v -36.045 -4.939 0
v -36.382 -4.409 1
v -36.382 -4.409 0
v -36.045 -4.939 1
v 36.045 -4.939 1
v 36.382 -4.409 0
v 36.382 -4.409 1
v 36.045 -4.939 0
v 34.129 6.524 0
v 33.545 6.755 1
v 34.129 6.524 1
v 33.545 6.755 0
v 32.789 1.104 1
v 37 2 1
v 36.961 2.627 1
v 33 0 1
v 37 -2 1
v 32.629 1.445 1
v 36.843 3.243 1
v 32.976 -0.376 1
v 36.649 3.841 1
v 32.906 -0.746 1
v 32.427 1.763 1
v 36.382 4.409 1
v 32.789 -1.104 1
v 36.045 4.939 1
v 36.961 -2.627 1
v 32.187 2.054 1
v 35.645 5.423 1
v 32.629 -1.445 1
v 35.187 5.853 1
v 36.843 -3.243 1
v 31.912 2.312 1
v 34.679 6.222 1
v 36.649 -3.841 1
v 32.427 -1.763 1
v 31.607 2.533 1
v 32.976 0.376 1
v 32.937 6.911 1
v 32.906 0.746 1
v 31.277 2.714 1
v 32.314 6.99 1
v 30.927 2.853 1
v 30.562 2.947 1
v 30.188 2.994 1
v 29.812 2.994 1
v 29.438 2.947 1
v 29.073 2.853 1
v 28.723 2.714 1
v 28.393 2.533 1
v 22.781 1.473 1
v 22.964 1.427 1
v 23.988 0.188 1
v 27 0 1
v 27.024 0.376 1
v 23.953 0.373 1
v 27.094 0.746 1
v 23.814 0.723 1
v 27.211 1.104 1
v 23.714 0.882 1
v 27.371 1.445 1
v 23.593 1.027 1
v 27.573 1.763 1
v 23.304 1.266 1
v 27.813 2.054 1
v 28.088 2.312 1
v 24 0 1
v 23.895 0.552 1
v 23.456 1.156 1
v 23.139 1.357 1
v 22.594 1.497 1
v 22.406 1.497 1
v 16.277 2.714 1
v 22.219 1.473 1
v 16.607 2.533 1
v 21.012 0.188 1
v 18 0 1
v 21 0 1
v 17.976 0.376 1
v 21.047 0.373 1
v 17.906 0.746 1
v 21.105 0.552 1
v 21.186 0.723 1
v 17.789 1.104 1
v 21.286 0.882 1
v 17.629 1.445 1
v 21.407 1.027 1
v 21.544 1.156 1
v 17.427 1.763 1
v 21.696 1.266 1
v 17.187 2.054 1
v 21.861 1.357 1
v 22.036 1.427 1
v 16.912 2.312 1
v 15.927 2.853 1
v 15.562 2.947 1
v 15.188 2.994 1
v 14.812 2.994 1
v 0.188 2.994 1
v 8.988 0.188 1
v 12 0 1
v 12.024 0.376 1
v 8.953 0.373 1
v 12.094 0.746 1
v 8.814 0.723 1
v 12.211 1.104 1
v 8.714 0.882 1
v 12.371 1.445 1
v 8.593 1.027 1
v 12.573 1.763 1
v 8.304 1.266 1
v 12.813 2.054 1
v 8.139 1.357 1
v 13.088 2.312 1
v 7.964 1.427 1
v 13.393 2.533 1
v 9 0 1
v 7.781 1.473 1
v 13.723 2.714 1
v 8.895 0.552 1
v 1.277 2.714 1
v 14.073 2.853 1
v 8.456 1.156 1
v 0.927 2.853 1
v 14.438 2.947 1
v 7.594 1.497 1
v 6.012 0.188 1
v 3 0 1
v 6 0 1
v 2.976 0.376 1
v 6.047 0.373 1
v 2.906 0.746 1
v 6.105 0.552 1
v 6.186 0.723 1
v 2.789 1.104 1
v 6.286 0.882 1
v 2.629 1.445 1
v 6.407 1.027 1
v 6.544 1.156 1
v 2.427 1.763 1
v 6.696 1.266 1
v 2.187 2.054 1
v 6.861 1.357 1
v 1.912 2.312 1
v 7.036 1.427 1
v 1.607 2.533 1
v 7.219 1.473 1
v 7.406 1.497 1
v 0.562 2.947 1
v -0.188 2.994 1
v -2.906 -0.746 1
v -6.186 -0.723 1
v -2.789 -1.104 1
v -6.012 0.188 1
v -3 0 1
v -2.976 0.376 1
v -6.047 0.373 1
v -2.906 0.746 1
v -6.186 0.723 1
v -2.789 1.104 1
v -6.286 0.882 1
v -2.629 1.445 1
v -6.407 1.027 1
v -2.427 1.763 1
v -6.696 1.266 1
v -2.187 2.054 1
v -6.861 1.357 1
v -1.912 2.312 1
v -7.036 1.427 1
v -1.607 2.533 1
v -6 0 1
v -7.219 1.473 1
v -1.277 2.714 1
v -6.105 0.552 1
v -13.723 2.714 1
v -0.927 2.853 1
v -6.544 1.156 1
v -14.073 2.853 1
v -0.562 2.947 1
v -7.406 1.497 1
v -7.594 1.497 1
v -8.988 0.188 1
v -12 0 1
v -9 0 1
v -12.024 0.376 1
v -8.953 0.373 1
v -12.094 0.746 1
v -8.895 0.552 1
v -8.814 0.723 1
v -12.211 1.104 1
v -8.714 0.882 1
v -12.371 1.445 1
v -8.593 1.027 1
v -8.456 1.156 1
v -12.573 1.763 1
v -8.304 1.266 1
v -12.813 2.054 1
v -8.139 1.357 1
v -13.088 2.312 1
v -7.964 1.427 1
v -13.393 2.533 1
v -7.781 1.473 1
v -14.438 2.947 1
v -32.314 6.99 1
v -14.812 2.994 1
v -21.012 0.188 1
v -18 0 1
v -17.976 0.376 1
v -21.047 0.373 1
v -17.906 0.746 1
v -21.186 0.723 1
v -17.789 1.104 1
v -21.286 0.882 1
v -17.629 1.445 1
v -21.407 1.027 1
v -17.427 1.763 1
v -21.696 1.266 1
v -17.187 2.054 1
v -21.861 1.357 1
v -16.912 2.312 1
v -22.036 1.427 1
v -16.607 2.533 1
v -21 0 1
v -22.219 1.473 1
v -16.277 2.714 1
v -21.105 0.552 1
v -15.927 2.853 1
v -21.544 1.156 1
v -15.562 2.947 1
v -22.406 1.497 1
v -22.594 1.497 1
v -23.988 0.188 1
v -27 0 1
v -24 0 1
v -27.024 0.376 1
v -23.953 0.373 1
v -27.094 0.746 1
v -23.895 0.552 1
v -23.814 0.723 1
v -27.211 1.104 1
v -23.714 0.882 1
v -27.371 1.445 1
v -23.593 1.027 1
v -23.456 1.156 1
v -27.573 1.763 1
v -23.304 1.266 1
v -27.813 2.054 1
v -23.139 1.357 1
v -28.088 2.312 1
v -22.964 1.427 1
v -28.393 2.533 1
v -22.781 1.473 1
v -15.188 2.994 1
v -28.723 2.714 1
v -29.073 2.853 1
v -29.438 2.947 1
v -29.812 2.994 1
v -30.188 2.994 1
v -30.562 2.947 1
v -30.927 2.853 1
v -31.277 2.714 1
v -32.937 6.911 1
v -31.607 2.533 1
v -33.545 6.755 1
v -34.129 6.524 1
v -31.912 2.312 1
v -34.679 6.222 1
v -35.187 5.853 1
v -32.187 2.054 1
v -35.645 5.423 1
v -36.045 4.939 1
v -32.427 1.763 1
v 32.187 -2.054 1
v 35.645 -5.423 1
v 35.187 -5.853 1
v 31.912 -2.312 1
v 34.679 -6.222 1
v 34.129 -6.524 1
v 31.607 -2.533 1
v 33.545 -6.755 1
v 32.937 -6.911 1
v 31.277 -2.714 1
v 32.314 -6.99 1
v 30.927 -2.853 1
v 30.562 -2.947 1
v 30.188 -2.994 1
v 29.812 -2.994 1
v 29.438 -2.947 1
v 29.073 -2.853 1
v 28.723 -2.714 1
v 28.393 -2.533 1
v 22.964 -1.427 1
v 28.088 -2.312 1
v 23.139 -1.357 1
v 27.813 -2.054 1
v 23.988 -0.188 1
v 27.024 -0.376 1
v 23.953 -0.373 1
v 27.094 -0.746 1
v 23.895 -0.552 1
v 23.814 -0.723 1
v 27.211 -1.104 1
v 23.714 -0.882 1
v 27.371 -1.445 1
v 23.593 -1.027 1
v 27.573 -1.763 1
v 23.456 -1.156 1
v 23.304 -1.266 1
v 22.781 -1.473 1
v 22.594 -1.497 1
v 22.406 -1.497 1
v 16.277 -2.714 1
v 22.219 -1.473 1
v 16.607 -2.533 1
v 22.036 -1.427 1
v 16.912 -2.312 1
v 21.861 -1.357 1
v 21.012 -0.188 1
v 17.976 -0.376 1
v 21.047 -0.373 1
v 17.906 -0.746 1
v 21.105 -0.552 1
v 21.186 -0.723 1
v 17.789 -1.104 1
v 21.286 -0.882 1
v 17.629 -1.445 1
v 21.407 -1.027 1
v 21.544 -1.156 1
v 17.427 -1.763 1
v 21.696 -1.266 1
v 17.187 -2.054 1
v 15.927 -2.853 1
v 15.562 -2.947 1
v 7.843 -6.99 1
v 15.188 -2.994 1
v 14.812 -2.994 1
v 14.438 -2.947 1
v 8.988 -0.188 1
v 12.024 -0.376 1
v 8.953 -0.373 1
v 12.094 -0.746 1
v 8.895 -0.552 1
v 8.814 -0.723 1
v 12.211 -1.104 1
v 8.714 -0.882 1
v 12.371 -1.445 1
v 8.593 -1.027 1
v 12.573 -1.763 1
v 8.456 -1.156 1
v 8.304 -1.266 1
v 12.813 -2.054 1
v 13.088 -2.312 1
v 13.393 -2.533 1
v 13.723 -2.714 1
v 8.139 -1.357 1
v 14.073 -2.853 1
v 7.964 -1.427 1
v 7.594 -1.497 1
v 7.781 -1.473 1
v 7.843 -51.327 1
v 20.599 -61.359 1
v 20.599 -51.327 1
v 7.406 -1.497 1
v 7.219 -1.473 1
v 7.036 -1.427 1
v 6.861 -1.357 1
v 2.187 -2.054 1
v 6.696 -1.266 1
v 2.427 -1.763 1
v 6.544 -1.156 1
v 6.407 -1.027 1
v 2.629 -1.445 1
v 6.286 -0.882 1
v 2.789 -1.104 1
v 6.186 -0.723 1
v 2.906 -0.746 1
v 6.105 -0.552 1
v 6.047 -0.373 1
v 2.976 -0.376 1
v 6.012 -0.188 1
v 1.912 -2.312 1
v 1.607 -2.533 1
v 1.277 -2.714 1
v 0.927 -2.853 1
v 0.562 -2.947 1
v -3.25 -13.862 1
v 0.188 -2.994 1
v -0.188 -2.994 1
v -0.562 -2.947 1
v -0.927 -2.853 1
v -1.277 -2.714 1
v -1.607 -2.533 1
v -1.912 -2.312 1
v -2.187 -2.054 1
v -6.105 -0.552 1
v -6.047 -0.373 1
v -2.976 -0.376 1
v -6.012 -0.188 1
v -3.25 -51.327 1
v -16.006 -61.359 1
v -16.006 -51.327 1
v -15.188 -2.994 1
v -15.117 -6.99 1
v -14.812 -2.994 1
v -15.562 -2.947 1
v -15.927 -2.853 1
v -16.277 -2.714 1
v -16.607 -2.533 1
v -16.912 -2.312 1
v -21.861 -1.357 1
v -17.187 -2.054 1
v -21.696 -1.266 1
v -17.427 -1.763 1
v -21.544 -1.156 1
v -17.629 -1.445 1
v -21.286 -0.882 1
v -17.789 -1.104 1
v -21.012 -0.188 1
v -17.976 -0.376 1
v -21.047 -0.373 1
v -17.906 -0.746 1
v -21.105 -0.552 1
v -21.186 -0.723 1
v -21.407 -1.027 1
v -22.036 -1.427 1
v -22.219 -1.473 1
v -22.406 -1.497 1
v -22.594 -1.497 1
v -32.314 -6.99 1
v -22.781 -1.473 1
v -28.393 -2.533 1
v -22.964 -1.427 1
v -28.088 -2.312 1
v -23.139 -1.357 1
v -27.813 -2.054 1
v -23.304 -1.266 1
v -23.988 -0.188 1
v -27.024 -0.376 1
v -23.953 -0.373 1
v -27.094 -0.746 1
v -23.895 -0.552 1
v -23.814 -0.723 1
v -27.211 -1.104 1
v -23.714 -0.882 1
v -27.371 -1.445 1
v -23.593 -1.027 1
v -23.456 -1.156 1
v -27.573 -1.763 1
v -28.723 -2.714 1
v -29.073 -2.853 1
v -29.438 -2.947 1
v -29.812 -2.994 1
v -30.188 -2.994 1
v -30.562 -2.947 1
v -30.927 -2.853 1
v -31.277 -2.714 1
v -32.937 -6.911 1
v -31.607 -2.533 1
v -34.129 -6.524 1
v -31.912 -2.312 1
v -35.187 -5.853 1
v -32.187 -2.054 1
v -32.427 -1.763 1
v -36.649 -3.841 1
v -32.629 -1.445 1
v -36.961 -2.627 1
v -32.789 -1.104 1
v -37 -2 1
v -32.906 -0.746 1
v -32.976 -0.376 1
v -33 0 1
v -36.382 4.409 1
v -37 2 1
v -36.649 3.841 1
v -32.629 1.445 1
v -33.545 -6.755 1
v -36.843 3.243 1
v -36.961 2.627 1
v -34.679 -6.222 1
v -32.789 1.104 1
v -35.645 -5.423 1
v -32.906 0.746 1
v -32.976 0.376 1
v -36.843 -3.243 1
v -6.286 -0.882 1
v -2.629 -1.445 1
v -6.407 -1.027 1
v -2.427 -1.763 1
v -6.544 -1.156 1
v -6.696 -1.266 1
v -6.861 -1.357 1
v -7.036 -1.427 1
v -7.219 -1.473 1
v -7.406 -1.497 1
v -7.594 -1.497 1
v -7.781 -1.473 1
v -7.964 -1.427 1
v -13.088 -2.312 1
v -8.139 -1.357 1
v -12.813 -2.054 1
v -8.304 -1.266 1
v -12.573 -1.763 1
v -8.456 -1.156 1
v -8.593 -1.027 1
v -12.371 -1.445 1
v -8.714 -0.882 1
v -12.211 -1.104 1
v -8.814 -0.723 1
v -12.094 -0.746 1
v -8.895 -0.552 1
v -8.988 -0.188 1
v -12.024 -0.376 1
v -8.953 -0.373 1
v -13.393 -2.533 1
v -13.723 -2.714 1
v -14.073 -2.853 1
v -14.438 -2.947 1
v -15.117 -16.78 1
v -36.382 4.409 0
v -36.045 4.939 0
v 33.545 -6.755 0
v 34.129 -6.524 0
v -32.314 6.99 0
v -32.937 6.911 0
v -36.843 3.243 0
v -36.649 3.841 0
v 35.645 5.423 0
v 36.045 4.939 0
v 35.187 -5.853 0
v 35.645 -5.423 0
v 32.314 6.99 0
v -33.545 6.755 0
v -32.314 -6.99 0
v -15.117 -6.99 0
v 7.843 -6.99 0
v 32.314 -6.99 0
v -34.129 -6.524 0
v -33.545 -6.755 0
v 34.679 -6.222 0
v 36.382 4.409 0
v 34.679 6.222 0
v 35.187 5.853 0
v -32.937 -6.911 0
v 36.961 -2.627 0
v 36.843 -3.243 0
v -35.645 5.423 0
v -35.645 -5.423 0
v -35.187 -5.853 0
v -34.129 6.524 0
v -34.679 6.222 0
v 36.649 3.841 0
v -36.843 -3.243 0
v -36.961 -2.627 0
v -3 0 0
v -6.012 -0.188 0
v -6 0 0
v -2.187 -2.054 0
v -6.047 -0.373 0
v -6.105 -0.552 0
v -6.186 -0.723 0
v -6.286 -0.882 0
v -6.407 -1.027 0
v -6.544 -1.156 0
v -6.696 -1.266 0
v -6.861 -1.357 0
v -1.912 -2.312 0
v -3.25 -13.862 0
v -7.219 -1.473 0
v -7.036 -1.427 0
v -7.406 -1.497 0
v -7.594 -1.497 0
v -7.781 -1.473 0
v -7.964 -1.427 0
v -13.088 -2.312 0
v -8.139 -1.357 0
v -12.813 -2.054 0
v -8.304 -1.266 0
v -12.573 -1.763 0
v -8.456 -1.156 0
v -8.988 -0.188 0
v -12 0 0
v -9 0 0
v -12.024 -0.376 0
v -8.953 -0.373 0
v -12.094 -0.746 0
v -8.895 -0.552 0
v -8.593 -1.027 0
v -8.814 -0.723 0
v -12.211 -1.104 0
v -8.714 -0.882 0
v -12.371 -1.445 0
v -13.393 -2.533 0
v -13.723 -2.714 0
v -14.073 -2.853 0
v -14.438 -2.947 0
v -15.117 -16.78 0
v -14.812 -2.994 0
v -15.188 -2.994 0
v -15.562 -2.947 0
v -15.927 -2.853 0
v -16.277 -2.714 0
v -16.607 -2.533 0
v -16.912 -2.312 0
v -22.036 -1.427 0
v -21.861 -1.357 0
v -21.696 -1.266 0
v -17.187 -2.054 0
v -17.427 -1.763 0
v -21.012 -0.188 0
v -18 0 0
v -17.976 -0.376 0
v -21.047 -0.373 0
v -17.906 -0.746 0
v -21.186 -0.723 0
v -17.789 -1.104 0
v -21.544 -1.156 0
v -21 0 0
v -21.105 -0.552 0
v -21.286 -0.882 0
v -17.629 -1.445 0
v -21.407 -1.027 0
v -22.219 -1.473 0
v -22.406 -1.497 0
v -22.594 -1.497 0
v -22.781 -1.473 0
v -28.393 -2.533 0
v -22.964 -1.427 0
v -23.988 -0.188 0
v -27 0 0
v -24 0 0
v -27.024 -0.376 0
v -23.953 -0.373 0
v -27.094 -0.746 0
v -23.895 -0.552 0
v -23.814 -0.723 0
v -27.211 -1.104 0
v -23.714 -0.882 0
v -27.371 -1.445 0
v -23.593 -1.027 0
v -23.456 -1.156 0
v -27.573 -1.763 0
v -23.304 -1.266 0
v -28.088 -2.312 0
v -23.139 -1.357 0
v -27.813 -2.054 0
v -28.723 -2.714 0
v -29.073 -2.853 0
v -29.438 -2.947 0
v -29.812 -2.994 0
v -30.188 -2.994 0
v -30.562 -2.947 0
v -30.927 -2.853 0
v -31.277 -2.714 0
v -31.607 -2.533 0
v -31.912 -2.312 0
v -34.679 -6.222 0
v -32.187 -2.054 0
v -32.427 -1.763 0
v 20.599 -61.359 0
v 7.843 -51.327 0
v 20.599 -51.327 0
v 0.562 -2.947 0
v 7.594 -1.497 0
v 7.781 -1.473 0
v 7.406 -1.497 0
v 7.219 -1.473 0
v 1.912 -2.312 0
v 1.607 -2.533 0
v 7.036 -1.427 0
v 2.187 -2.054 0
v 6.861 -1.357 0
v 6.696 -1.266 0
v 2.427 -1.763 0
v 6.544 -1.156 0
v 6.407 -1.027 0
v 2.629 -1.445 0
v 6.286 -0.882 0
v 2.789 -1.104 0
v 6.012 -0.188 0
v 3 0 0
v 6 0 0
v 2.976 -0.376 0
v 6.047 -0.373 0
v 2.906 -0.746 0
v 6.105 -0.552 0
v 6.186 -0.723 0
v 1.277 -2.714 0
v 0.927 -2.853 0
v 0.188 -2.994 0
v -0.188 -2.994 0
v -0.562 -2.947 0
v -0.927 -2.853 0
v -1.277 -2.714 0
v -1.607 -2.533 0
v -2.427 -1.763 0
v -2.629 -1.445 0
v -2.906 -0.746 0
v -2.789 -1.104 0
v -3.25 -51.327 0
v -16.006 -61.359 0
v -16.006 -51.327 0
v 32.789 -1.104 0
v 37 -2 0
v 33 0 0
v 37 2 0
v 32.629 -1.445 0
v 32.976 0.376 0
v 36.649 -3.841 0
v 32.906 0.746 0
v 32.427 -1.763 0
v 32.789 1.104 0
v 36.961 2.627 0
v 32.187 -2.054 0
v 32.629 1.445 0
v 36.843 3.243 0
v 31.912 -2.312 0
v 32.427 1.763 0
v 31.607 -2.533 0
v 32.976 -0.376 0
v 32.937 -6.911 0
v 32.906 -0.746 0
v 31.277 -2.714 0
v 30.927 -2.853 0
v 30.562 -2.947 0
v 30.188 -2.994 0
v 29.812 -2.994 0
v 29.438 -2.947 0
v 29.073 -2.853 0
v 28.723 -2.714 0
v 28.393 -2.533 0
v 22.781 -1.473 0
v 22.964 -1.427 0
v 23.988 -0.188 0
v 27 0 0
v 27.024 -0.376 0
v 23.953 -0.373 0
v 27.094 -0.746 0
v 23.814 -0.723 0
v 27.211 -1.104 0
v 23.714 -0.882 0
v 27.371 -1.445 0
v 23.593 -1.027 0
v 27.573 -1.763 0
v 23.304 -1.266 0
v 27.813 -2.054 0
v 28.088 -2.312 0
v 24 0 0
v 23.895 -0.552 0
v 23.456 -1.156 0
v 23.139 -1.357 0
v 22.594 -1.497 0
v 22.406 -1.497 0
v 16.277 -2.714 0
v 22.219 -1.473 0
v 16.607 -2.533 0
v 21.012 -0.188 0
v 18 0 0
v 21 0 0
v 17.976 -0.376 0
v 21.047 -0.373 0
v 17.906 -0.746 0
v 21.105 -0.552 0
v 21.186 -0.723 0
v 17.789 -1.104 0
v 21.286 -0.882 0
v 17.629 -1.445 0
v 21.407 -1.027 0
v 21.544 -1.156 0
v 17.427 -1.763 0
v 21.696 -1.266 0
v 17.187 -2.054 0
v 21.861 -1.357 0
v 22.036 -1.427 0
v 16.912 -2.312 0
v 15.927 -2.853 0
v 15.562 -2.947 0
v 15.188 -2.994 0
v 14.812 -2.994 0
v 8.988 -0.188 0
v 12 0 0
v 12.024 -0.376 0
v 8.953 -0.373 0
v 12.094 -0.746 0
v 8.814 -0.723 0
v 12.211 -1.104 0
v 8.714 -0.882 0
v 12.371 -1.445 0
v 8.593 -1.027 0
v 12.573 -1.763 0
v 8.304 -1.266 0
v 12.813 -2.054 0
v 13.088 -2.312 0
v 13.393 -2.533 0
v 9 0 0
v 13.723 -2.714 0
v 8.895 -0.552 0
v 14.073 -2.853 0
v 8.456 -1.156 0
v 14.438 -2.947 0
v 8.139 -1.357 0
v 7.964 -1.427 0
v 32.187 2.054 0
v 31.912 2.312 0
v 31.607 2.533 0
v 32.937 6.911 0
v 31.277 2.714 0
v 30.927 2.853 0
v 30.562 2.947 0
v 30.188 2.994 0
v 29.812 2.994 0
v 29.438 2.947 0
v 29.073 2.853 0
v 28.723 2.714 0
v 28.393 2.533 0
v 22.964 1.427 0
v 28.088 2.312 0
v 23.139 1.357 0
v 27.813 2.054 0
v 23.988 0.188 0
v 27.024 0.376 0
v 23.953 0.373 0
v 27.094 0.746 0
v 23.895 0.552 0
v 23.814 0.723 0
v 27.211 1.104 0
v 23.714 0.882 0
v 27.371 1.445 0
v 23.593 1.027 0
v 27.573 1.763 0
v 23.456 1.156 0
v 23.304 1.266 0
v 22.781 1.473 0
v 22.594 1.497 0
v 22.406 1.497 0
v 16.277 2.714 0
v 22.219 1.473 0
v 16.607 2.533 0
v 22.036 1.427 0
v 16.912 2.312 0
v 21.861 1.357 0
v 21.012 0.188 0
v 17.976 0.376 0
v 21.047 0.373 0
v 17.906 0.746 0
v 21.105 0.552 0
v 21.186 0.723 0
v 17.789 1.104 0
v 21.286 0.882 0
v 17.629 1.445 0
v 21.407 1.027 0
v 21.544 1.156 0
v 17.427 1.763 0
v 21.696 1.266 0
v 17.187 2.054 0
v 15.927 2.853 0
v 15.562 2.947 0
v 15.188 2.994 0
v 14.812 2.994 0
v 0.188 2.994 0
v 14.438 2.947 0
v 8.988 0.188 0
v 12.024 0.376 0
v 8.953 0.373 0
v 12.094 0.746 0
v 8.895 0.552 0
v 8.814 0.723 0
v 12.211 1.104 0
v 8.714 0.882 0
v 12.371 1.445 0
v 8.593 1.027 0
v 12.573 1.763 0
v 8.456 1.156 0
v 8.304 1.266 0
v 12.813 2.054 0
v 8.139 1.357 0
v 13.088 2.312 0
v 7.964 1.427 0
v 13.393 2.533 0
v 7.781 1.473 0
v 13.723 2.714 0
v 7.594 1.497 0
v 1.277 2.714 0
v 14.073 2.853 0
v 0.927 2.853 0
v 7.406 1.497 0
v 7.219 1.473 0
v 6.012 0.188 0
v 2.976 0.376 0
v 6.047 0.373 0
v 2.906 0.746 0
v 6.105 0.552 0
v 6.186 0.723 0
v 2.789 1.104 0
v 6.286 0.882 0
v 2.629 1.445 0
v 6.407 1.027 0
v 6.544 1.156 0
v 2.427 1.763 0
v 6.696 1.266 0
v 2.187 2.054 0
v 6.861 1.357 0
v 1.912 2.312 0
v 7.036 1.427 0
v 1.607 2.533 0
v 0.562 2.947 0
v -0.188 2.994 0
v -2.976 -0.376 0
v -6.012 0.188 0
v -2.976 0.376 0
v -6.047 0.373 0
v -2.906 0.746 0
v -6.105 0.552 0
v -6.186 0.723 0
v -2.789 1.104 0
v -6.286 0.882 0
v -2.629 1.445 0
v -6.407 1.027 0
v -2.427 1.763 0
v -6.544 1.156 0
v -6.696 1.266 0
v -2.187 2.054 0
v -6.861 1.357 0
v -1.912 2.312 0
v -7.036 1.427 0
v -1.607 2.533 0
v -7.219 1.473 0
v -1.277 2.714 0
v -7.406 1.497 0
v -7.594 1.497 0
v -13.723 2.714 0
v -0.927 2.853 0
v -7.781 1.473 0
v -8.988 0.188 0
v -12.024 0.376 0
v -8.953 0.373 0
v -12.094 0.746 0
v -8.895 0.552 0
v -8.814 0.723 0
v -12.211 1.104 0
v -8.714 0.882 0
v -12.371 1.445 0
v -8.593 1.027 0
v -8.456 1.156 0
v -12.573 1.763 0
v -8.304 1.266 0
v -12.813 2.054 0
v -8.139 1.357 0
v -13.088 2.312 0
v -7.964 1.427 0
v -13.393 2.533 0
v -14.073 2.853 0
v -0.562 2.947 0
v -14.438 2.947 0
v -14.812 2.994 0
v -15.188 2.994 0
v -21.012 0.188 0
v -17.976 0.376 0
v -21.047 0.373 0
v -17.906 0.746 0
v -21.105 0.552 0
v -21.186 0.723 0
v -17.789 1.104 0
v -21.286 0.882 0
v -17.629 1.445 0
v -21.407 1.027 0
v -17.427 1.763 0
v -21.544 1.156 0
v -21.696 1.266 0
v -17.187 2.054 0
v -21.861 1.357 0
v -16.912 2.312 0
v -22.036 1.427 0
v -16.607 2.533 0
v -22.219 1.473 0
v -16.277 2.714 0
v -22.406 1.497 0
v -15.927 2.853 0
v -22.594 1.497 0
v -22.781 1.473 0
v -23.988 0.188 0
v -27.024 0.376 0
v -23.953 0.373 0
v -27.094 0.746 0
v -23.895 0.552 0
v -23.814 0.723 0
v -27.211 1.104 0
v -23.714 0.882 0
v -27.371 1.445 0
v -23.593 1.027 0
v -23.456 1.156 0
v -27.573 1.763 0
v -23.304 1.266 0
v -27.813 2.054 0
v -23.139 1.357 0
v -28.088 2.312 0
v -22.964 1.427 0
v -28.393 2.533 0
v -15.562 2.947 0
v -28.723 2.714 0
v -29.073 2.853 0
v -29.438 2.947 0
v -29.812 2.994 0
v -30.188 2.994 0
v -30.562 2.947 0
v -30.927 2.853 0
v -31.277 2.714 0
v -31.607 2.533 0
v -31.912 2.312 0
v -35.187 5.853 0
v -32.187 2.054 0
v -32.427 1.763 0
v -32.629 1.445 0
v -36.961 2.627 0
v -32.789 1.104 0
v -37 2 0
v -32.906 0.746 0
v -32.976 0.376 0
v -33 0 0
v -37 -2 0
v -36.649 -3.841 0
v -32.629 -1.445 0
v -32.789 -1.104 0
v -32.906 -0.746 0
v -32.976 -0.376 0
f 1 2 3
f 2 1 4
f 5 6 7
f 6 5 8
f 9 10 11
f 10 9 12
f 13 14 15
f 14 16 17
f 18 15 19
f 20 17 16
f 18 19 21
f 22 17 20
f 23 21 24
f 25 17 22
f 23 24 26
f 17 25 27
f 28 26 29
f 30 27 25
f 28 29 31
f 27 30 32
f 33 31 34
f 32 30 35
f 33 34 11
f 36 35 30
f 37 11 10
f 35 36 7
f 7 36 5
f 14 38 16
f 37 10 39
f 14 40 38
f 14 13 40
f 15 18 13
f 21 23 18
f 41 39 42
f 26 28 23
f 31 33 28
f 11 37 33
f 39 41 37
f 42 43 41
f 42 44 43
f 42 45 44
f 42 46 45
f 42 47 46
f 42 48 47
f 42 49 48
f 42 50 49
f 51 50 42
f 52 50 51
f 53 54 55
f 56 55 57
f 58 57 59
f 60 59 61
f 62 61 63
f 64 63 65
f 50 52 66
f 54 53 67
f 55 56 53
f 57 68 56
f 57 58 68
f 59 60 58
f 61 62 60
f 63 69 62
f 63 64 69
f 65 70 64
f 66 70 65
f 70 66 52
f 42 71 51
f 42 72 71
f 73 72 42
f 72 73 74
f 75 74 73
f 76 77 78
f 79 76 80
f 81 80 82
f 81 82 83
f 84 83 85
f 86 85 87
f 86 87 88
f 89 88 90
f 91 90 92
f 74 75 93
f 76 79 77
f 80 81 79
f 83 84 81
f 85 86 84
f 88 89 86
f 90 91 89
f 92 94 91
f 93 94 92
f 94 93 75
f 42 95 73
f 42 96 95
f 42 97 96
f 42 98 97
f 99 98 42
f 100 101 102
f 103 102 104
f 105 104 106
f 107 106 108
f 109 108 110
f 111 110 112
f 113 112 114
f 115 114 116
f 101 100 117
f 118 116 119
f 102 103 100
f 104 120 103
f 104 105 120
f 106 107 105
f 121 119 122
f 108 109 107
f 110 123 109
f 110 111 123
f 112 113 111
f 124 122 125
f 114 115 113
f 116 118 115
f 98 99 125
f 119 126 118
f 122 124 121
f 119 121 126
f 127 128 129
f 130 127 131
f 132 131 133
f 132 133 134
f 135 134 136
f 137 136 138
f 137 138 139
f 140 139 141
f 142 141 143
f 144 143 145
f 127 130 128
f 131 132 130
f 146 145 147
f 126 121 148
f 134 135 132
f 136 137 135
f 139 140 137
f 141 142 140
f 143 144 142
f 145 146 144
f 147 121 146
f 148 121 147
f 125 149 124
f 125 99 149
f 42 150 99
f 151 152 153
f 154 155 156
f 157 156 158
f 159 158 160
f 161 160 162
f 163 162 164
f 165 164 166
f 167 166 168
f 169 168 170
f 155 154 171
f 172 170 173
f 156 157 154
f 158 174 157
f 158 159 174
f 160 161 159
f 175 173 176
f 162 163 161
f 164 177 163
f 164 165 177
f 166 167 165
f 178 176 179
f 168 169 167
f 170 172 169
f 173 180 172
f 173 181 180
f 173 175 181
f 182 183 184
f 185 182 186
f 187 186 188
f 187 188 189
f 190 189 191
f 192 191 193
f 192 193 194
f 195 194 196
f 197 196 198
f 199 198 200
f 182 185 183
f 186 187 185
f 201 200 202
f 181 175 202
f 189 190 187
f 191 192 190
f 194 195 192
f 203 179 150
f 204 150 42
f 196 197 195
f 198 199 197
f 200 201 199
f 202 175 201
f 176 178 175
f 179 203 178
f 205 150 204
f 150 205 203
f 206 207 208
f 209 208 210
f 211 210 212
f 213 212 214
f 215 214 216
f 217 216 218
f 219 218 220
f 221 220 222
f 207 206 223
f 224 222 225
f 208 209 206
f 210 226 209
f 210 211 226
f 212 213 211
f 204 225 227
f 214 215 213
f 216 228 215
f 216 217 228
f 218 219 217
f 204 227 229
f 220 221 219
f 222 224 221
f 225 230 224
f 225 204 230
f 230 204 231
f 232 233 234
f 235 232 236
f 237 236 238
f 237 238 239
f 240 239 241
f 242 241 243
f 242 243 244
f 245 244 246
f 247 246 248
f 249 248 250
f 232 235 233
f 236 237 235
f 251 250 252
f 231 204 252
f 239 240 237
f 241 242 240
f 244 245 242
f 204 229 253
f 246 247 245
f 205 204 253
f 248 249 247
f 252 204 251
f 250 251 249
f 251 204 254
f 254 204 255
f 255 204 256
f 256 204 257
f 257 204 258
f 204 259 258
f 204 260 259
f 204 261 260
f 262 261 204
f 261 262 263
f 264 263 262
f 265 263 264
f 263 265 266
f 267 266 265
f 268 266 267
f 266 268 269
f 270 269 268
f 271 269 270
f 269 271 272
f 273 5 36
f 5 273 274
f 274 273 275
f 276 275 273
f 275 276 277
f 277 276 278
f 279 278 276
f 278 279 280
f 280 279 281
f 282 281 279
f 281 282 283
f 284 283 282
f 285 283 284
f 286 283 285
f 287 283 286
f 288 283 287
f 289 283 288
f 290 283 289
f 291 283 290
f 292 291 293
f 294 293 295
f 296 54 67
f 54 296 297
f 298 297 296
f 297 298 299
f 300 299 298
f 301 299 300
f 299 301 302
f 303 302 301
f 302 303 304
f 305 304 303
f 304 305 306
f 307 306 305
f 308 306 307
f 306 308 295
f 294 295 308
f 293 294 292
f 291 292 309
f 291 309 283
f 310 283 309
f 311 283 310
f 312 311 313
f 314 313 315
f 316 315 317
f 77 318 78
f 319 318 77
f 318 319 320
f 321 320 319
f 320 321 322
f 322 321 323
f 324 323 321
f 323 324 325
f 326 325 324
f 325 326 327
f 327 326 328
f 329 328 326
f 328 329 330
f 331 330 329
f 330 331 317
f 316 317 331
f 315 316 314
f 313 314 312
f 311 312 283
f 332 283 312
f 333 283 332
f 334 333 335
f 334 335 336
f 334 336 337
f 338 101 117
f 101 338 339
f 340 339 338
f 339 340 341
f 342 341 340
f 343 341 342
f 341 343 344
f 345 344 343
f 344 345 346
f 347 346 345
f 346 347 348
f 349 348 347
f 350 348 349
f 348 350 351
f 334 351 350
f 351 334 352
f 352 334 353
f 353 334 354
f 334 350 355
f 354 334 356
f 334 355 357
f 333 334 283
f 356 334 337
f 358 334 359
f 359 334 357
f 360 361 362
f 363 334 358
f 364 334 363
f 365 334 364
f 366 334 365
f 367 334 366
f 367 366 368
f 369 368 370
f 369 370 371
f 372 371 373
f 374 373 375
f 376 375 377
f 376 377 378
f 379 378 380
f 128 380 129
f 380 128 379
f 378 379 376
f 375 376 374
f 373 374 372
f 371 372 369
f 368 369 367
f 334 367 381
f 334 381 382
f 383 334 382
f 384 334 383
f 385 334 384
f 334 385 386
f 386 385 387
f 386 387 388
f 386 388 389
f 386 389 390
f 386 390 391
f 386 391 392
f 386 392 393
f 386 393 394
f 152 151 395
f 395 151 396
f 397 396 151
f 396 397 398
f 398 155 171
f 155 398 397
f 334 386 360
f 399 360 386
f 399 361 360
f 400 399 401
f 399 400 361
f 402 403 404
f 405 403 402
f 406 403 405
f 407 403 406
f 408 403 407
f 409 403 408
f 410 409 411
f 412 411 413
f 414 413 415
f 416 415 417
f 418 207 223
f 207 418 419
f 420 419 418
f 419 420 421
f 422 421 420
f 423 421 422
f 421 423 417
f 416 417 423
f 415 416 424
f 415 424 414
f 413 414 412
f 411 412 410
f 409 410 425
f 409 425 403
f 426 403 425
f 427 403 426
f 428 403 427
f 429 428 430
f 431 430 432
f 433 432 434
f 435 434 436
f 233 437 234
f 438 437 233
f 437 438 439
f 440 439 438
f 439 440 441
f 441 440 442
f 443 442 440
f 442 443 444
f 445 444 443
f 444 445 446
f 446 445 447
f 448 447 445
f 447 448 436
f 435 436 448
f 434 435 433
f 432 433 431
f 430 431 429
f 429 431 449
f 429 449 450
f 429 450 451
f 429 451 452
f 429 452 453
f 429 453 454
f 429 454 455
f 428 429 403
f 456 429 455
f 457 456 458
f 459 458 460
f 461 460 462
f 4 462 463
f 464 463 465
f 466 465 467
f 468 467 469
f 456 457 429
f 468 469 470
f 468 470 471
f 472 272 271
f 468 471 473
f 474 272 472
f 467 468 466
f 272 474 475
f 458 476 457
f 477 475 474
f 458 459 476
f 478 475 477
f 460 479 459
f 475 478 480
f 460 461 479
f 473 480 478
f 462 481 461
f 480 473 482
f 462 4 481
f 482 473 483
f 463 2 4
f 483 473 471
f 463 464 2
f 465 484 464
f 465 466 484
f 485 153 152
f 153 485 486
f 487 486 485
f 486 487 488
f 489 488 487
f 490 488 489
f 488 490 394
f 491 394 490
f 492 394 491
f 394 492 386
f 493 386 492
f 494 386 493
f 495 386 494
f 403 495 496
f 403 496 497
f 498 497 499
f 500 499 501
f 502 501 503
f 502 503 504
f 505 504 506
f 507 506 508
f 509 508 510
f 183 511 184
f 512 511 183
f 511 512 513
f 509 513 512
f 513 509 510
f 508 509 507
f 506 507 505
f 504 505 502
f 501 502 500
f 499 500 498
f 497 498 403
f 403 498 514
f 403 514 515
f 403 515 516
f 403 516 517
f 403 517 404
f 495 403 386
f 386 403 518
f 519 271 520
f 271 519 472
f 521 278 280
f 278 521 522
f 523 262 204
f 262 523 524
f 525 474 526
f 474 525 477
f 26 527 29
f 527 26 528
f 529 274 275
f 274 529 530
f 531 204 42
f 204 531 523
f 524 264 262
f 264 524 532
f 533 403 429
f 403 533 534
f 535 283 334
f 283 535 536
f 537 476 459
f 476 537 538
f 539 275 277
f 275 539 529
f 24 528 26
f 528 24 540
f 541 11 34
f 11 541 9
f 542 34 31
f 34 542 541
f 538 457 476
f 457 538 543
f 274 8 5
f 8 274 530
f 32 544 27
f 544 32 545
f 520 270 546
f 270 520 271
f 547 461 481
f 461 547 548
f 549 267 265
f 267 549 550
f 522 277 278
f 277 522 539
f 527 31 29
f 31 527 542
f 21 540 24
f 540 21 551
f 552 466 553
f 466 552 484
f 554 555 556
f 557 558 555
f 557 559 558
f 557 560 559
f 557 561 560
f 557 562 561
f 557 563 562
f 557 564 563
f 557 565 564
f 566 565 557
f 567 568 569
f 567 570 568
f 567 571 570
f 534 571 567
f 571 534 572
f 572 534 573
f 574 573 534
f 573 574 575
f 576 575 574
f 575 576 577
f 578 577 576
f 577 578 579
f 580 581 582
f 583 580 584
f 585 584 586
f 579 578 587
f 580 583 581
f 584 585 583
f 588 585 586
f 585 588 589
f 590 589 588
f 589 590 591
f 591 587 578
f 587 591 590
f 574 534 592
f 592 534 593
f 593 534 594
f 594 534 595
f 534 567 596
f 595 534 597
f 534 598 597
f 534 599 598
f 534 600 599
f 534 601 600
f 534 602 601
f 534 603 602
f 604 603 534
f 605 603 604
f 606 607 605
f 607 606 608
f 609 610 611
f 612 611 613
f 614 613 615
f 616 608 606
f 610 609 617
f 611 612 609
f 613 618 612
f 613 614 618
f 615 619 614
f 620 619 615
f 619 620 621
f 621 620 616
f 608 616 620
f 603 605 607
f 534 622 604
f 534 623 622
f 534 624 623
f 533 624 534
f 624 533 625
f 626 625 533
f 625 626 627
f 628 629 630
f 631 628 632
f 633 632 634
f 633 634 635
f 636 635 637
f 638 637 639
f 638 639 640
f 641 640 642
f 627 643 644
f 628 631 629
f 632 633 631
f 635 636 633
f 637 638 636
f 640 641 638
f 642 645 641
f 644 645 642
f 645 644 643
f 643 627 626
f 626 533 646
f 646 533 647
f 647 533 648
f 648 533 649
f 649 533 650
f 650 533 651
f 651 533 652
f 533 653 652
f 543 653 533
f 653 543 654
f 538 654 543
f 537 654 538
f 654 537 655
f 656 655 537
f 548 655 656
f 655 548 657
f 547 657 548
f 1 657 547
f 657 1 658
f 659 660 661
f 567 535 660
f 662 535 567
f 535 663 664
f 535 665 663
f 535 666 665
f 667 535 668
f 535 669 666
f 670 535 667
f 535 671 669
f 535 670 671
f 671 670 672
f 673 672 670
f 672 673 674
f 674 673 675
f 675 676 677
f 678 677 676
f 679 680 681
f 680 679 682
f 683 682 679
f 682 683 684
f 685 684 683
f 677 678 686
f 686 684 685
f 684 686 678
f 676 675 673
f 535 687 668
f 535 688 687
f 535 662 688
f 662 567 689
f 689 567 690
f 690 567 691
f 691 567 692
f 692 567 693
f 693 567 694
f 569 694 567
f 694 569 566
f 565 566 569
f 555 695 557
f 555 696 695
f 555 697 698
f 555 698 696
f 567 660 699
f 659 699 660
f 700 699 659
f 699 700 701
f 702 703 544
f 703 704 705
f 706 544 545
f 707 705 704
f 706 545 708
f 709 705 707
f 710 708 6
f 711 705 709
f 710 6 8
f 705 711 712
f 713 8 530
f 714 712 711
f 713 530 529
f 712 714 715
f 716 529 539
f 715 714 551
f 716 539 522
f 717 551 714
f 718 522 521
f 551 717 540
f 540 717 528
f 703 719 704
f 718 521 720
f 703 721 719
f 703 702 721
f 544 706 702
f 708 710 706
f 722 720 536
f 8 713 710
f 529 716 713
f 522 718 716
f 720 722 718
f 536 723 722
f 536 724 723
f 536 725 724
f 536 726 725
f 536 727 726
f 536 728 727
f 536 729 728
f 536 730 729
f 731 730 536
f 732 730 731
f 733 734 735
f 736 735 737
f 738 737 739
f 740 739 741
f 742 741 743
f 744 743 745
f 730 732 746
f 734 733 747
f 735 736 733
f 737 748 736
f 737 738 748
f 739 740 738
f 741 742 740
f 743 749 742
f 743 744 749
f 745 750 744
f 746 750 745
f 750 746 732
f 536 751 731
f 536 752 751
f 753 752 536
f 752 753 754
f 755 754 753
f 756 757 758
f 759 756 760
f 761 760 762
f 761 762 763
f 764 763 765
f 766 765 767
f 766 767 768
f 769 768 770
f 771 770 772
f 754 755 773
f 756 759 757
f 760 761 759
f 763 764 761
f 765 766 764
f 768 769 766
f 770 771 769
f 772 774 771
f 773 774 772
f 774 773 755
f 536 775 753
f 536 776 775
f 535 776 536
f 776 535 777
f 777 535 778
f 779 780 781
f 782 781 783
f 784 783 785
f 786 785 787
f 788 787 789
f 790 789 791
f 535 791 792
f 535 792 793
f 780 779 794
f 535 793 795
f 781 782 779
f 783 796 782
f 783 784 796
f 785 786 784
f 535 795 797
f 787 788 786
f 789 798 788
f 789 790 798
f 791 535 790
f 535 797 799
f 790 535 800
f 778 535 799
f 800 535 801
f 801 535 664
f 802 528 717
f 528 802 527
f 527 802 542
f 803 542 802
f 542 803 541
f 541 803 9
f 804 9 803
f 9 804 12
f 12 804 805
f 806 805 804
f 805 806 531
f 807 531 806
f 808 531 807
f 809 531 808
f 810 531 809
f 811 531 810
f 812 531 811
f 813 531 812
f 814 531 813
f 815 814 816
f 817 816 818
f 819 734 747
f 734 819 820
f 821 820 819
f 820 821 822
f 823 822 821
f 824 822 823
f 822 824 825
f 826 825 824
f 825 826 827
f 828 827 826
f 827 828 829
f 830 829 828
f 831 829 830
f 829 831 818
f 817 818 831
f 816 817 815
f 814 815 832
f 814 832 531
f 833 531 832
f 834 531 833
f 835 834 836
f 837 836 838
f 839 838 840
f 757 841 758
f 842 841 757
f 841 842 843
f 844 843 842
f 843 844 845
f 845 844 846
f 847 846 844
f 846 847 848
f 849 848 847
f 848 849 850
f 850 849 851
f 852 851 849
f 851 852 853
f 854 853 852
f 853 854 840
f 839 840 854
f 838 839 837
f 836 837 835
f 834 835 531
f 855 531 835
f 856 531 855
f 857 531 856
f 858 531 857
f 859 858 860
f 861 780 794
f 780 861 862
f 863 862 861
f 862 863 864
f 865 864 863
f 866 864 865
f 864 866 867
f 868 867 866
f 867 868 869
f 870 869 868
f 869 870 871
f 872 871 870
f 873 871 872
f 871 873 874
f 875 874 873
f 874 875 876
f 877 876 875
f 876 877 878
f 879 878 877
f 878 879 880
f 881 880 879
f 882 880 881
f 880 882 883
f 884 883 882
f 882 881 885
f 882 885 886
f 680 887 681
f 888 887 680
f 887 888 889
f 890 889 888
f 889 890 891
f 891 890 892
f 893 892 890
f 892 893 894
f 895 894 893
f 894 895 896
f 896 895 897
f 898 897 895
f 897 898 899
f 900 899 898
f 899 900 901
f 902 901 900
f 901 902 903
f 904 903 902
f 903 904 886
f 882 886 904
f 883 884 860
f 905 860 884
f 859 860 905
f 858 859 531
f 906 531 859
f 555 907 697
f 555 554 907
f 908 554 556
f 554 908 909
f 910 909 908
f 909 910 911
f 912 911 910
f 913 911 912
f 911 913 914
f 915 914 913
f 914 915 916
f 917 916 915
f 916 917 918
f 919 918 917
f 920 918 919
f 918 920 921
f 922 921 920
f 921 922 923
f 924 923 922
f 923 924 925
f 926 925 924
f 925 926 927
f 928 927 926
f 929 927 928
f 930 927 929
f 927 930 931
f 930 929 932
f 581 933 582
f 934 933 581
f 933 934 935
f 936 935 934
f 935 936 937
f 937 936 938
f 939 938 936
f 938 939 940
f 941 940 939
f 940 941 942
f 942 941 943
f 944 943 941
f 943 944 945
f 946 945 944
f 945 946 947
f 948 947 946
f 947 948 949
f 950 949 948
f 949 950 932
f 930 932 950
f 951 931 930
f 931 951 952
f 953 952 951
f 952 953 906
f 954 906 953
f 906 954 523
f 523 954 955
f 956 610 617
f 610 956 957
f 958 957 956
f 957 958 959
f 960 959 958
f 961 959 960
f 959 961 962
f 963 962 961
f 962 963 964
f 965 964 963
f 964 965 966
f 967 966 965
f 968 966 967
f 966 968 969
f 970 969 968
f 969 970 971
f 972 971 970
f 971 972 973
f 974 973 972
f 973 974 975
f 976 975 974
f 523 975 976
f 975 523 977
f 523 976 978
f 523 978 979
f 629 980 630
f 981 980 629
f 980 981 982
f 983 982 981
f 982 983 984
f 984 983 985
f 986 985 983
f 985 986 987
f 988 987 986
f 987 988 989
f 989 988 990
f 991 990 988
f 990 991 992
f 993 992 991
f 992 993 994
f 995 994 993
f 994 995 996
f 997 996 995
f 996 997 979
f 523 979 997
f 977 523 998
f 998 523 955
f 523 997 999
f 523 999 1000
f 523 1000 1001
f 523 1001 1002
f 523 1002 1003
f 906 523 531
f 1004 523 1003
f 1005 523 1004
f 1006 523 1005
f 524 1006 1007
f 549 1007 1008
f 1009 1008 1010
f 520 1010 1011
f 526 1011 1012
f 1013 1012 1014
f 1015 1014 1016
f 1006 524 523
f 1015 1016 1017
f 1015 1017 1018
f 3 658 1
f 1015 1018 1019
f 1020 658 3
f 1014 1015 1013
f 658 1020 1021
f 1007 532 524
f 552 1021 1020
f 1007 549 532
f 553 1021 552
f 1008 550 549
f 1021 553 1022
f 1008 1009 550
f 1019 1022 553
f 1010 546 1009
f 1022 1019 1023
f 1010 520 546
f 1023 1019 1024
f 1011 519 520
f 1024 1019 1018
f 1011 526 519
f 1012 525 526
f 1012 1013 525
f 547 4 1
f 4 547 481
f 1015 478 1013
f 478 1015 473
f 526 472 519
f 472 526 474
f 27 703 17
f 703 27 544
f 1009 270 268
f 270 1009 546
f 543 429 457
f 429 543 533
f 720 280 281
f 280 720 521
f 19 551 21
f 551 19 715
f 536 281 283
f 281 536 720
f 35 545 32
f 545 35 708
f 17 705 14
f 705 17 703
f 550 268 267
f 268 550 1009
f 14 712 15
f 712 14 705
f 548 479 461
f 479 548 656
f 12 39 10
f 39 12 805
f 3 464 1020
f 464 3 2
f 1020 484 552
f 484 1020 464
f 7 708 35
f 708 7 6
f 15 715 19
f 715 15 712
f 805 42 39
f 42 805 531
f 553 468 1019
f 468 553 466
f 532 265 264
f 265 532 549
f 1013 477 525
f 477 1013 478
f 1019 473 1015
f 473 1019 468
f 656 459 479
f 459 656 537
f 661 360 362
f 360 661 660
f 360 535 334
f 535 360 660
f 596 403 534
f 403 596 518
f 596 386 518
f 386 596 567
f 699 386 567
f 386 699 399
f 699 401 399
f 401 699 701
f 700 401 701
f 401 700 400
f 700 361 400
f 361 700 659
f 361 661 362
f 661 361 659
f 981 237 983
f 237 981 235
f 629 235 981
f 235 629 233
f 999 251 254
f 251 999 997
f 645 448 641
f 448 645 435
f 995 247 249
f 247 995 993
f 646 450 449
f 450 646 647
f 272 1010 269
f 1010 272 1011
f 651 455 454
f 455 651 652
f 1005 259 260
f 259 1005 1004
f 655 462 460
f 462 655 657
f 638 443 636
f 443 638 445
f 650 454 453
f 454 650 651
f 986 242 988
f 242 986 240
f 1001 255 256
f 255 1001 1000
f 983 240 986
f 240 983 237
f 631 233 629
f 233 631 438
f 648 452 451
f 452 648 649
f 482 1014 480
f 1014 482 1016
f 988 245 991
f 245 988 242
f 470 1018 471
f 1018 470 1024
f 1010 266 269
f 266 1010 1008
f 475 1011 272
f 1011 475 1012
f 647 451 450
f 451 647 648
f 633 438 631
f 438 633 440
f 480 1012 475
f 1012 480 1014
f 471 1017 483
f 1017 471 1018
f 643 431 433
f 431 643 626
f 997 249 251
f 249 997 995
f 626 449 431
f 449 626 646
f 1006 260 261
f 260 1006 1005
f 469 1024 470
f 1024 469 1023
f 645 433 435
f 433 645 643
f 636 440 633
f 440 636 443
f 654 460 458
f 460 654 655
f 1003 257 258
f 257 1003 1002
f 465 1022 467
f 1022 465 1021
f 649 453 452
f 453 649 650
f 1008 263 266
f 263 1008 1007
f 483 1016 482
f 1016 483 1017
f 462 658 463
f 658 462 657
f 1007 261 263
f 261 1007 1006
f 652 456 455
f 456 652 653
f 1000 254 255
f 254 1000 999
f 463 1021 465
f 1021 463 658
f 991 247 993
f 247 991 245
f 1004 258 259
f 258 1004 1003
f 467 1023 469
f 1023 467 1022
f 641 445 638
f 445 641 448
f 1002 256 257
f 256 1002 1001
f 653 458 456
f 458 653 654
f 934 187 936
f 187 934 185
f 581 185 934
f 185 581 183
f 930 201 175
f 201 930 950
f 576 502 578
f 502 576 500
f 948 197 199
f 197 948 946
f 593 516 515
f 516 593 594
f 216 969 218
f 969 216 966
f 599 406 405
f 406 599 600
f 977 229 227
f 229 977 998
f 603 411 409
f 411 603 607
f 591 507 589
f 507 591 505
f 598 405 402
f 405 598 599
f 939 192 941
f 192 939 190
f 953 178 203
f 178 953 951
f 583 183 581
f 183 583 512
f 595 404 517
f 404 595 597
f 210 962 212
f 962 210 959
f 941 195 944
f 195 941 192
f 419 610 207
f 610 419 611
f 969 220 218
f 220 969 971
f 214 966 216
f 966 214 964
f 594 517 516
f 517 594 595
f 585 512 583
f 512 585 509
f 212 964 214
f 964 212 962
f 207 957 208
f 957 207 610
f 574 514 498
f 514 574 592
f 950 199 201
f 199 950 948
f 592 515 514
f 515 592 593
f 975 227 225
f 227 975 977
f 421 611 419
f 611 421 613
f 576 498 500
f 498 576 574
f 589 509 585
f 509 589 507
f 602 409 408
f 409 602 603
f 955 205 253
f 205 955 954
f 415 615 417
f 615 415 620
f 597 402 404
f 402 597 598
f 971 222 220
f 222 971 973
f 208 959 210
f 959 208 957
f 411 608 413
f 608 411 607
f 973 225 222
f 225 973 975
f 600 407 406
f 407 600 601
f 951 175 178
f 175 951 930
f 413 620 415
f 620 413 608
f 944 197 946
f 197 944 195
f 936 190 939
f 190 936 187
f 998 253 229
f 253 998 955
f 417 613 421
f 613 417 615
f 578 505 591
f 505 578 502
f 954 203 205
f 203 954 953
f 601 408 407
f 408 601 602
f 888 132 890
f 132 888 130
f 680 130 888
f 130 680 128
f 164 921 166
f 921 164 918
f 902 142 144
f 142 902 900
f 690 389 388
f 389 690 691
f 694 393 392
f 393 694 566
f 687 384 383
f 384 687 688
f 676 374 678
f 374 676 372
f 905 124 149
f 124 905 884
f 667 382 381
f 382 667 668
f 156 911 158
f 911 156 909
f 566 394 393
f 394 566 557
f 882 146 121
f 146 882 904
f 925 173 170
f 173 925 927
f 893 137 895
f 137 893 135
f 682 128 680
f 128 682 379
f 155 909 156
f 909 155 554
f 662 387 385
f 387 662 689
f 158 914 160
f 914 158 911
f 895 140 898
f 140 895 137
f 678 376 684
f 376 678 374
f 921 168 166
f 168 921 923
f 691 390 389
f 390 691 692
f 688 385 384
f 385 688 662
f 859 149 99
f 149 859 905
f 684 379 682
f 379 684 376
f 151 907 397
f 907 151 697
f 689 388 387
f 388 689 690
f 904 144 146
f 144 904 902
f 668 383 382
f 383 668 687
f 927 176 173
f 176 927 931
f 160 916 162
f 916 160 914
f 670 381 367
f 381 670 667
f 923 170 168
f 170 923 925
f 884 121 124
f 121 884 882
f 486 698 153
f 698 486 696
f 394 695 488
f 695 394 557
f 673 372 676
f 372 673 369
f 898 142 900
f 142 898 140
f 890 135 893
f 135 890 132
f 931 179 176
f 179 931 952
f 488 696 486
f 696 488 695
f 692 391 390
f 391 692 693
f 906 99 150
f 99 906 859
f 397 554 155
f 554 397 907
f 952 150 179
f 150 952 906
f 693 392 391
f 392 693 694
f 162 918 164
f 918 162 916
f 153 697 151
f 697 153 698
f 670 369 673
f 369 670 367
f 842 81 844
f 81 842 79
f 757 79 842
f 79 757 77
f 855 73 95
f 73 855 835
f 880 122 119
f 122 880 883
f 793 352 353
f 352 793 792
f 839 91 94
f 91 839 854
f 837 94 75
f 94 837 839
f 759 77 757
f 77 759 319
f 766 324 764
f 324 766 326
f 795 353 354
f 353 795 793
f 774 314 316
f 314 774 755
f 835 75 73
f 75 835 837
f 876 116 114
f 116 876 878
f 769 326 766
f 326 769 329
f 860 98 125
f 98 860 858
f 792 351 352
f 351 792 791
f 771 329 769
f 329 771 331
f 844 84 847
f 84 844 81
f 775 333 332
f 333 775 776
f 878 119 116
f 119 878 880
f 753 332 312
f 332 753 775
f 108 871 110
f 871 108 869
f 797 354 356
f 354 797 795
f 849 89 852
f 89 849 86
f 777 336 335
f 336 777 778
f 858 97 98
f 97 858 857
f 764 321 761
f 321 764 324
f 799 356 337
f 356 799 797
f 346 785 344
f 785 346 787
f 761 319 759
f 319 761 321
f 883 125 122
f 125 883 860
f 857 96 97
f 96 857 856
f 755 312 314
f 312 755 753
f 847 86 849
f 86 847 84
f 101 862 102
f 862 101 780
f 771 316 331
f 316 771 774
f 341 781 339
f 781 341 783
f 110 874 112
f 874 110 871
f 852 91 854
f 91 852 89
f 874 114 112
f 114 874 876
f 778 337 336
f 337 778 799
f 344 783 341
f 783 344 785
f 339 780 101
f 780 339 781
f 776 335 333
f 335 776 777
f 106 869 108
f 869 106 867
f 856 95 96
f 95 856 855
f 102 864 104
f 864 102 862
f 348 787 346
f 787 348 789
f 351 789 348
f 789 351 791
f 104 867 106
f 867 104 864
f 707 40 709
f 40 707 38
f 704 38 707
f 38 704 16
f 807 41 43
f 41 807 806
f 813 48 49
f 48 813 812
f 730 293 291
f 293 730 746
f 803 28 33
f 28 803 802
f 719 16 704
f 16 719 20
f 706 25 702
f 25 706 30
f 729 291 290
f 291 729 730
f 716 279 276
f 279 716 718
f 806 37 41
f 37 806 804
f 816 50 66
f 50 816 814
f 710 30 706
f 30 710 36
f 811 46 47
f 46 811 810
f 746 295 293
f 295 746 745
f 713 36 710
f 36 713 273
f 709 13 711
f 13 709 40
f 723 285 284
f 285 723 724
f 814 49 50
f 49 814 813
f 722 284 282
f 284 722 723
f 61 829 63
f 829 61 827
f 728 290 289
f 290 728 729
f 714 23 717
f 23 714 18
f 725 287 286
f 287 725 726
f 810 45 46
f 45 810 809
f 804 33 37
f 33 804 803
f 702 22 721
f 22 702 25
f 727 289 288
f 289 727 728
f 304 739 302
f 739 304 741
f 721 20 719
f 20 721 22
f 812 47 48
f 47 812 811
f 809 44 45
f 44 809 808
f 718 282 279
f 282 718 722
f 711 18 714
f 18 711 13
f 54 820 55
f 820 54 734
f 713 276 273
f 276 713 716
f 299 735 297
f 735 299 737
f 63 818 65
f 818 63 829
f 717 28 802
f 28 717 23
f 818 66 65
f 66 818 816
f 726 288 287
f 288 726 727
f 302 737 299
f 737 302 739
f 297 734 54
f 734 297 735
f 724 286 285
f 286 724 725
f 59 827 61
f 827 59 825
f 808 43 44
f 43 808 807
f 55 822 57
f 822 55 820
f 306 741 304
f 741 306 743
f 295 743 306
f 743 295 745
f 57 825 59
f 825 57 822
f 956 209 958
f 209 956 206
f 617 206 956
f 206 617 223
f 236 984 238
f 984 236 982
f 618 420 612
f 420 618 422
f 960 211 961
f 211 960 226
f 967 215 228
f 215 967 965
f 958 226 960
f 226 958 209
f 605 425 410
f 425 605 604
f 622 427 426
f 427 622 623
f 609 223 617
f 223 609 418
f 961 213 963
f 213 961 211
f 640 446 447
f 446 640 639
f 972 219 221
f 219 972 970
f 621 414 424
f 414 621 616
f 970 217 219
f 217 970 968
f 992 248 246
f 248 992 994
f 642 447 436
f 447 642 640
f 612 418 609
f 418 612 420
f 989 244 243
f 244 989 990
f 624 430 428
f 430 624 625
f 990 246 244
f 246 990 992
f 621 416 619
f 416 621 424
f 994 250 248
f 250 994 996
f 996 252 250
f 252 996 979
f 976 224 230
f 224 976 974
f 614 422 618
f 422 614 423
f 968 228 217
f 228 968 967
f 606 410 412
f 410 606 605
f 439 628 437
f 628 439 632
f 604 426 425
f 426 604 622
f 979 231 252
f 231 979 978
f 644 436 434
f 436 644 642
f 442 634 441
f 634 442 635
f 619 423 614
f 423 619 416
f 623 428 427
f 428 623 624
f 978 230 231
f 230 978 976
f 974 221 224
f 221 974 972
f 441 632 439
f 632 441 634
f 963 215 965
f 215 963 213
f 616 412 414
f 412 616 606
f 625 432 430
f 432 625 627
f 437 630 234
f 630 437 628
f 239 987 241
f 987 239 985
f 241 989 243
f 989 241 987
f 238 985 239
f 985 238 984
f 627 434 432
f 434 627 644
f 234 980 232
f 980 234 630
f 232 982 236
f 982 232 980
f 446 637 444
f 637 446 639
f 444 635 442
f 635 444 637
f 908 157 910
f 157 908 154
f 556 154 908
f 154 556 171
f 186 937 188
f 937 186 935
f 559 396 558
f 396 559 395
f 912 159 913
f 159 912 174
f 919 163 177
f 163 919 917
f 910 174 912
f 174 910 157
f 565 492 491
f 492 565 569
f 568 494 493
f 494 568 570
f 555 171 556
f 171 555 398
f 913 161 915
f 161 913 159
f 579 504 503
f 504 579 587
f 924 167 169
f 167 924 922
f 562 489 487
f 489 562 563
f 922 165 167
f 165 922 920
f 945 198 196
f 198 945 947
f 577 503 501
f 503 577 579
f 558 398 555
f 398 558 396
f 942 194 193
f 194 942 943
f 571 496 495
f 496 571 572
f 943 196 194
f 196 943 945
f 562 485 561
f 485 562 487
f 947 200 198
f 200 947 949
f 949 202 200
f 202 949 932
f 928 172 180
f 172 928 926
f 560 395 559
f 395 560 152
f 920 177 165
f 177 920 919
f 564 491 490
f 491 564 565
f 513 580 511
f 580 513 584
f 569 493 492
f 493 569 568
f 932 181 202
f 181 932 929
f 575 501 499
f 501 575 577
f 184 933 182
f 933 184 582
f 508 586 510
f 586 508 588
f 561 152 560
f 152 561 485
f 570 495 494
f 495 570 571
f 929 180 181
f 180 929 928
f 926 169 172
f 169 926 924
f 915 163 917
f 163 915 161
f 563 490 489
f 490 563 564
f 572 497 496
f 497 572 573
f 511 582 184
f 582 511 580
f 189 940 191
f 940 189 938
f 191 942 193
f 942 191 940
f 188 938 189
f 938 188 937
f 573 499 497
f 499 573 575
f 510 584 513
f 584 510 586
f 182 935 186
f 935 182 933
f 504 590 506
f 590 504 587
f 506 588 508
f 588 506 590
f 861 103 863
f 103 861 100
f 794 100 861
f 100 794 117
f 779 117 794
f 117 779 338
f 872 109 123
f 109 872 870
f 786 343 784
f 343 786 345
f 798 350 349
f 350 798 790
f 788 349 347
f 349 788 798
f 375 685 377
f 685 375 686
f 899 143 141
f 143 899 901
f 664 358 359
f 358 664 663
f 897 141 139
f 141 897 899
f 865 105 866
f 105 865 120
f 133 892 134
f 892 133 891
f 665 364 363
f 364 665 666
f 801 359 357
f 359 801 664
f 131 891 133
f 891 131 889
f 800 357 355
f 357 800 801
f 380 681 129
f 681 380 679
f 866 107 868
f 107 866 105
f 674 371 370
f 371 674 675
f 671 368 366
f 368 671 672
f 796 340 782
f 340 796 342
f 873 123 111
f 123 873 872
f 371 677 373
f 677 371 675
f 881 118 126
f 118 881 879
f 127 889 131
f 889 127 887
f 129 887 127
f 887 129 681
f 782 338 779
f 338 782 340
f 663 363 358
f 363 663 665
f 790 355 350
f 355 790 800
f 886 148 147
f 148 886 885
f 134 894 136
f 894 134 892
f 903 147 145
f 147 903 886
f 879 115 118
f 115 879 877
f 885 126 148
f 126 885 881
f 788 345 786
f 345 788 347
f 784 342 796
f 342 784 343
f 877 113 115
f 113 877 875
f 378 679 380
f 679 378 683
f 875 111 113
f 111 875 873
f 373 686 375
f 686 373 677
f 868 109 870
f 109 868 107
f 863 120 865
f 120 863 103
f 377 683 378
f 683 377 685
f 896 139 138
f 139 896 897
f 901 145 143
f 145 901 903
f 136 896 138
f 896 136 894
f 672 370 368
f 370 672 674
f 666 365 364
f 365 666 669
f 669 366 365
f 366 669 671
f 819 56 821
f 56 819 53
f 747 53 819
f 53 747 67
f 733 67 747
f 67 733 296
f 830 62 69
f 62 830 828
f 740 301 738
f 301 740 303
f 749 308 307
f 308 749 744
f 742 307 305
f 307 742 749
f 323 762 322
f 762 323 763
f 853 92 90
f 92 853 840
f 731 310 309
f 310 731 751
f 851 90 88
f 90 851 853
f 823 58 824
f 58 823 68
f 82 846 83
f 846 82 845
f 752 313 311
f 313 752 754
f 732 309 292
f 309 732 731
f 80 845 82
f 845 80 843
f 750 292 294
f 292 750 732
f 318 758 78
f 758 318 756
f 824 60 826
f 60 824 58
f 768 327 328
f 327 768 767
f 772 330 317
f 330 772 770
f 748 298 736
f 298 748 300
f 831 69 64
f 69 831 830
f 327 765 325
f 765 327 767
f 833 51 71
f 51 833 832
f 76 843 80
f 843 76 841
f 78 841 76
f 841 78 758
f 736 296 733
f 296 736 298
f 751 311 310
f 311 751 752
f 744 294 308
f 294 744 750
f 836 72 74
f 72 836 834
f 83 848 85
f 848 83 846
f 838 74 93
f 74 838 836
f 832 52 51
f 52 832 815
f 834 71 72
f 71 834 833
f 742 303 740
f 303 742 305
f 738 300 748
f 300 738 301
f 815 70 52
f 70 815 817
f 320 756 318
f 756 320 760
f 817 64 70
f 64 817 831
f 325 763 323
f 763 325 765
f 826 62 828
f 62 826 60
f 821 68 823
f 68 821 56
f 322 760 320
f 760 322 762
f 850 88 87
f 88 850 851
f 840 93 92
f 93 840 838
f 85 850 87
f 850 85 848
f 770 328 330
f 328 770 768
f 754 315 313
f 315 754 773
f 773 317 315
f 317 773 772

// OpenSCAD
$fn = 50;


difference() {
	union() {
		hull() {
			translate(v = [-32.0000000000, 2.0000000000, 0]) {
				cylinder(h = 1, r = 5);
			}
			translate(v = [32.0000000000, 2.0000000000, 0]) {
				cylinder(h = 1, r = 5);
			}
			translate(v = [-32.0000000000, -2.0000000000, 0]) {
				cylinder(h = 1, r = 5);
			}
			translate(v = [32.0000000000, -2.0000000000, 0]) {
				cylinder(h = 1, r = 5);
			}
		}
		translate(v = [0, -5, 0]) {
			linear_extrude(height = 1) {
				text(font = "DejaVu Sans Mono:style=Bold", halign = "center", size = 57.0000000000, text = "1", valign = "top");
			}
		}
	}
	union() {
		translate(v = [-30.0000000000, 0.0000000000, 0]) {
			translate(v = [0, 0, -100]) {
				cylinder(h = 200, r = 3.0000000000);
			}
		}
		translate(v = [-15.0000000000, 0.0000000000, 0]) {
			translate(v = [0, 0, -100]) {
				cylinder(h = 200, r = 3.0000000000);
			}
		}
		translate(v = [0, 0, -100]) {
			cylinder(h = 200, r = 3.0000000000);
		}
		translate(v = [15.0000000000, 0.0000000000, 0]) {
			translate(v = [0, 0, -100]) {
				cylinder(h = 200, r = 3.0000000000);
			}
		}
		translate(v = [30.0000000000, 0.0000000000, 0]) {
			translate(v = [0, 0, -100]) {
				cylinder(h = 200, r = 3.0000000000);
			}
		}
		translate(v = [-30.0000000000, 0.0000000000, 0]) {
			translate(v = [0, 0, -100]) {
				cylinder(h = 200, r = 1.5000000000);
			}
		}
		translate(v = [-22.5000000000, 0.0000000000, 0]) {
			translate(v = [0, 0, -100]) {
				cylinder(h = 200, r = 1.5000000000);
			}
		}
		translate(v = [-15.0000000000, 0.0000000000, 0]) {
			translate(v = [0, 0, -100]) {
				cylinder(h = 200, r = 1.5000000000);
			}
		}
		translate(v = [-7.5000000000, 0.0000000000, 0]) {
			translate(v = [0, 0, -100]) {
				cylinder(h = 200, r = 1.5000000000);
			}
		}
		translate(v = [0, 0, -100]) {
			cylinder(h = 200, r = 1.5000000000);
		}
		translate(v = [7.5000000000, 0.0000000000, 0]) {
			translate(v = [0, 0, -100]) {
				cylinder(h = 200, r = 1.5000000000);
			}
		}
		translate(v = [15.0000000000, 0.0000000000, 0]) {
			translate(v = [0, 0, -100]) {
				cylinder(h = 200, r = 1.5000000000);
			}
		}
		translate(v = [22.5000000000, 0.0000000000, 0]) {
			translate(v = [0, 0, -100]) {
				cylinder(h = 200, r = 1.5000000000);
			}
		}
		translate(v = [30.0000000000, 0.0000000000, 0]) {
			translate(v = [0, 0, -100]) {
				cylinder(h = 200, r = 1.5000000000);
			}
		}
	}
}
